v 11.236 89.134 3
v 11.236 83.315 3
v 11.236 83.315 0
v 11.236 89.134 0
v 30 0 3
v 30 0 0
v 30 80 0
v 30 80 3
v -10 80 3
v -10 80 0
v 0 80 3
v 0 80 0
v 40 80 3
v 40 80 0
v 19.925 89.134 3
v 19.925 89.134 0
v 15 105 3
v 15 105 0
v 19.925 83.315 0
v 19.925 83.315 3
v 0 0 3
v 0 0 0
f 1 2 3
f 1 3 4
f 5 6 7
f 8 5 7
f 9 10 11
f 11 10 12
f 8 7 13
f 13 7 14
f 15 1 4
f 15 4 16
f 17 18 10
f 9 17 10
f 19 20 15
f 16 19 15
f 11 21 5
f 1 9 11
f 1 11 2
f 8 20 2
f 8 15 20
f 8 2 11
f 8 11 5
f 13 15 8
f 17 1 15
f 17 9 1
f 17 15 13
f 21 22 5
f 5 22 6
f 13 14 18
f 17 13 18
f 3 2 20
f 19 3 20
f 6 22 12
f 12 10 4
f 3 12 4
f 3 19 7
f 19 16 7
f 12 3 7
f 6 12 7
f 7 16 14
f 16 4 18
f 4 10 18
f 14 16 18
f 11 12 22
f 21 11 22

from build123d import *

# Parameters (mm, degrees)
BOSS_EXTRUDE2_DEPTH = 3
SKETCH2_W           = 8.689494808
SKETCH2_H           = 5.818516347
CUT_EXTRUDE1_DEPTH  = 3


with BuildPart() as part:
    # Model → Boss-Extrude2 (new body)
    with BuildSketch(Plane.XY):
        Polygon((0, 0), (30, 0), (30, 80), (40, 80), (15, 105), (-10, 80), (0, 80), align=None)
    extrude(amount=BOSS_EXTRUDE2_DEPTH)

    # Sketch2 → Cut-Extrude1 (cut)
    with BuildSketch(Plane.XY.offset(3)):
        with Locations((15.580557609, 86.224591519)):
            Rectangle(SKETCH2_W, SKETCH2_H)
    extrude(amount=-CUT_EXTRUDE1_DEPTH, mode=Mode.SUBTRACT)


solid = part.part
